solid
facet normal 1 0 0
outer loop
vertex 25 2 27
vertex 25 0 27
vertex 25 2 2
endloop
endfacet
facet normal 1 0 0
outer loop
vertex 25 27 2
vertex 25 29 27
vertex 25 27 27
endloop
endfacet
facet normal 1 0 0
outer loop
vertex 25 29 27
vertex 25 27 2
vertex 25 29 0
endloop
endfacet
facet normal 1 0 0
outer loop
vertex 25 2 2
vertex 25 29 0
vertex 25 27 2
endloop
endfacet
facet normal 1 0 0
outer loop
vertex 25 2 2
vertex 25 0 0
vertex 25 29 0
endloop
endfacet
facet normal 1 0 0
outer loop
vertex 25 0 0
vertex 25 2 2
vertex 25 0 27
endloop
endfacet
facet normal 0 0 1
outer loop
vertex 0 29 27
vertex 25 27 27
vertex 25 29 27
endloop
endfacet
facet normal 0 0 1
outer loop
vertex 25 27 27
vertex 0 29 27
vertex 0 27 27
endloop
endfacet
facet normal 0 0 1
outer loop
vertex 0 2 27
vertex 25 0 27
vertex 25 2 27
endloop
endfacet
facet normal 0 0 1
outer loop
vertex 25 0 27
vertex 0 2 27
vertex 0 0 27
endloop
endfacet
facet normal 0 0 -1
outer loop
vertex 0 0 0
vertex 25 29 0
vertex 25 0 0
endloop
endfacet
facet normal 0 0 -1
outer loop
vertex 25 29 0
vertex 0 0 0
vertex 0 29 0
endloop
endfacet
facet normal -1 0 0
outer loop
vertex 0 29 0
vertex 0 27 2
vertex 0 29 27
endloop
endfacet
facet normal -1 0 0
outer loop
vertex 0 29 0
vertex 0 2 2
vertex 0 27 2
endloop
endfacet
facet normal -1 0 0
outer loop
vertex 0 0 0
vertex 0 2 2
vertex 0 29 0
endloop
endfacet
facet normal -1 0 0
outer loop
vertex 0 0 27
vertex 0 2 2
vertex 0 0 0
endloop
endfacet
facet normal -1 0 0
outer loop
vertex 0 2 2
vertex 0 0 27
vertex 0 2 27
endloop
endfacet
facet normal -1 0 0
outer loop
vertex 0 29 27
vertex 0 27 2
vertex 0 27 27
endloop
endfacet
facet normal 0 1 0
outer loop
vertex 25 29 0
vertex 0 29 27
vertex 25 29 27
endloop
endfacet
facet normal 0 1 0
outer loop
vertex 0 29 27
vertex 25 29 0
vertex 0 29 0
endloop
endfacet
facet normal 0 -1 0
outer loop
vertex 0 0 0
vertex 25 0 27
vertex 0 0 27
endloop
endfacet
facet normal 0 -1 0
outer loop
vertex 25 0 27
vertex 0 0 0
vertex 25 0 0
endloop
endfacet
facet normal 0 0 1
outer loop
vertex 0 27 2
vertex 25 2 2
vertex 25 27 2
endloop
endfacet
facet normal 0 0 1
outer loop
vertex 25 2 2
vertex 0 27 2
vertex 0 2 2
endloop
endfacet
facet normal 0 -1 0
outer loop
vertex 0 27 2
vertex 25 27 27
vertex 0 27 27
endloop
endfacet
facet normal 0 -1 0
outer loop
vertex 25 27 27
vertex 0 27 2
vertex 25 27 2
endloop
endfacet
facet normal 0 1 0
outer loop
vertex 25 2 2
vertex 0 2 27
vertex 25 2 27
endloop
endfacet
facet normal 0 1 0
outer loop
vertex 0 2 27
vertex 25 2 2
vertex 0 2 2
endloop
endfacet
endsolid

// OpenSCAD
w = 25;
d = 2;
eps = 0.01;

difference() {
    cube( [ w, w + 2*d, w + d ] );

    translate( [ -eps, d, d ] ) {
        cube( [ w + 2*eps, w, w + eps ] );
    }
}
